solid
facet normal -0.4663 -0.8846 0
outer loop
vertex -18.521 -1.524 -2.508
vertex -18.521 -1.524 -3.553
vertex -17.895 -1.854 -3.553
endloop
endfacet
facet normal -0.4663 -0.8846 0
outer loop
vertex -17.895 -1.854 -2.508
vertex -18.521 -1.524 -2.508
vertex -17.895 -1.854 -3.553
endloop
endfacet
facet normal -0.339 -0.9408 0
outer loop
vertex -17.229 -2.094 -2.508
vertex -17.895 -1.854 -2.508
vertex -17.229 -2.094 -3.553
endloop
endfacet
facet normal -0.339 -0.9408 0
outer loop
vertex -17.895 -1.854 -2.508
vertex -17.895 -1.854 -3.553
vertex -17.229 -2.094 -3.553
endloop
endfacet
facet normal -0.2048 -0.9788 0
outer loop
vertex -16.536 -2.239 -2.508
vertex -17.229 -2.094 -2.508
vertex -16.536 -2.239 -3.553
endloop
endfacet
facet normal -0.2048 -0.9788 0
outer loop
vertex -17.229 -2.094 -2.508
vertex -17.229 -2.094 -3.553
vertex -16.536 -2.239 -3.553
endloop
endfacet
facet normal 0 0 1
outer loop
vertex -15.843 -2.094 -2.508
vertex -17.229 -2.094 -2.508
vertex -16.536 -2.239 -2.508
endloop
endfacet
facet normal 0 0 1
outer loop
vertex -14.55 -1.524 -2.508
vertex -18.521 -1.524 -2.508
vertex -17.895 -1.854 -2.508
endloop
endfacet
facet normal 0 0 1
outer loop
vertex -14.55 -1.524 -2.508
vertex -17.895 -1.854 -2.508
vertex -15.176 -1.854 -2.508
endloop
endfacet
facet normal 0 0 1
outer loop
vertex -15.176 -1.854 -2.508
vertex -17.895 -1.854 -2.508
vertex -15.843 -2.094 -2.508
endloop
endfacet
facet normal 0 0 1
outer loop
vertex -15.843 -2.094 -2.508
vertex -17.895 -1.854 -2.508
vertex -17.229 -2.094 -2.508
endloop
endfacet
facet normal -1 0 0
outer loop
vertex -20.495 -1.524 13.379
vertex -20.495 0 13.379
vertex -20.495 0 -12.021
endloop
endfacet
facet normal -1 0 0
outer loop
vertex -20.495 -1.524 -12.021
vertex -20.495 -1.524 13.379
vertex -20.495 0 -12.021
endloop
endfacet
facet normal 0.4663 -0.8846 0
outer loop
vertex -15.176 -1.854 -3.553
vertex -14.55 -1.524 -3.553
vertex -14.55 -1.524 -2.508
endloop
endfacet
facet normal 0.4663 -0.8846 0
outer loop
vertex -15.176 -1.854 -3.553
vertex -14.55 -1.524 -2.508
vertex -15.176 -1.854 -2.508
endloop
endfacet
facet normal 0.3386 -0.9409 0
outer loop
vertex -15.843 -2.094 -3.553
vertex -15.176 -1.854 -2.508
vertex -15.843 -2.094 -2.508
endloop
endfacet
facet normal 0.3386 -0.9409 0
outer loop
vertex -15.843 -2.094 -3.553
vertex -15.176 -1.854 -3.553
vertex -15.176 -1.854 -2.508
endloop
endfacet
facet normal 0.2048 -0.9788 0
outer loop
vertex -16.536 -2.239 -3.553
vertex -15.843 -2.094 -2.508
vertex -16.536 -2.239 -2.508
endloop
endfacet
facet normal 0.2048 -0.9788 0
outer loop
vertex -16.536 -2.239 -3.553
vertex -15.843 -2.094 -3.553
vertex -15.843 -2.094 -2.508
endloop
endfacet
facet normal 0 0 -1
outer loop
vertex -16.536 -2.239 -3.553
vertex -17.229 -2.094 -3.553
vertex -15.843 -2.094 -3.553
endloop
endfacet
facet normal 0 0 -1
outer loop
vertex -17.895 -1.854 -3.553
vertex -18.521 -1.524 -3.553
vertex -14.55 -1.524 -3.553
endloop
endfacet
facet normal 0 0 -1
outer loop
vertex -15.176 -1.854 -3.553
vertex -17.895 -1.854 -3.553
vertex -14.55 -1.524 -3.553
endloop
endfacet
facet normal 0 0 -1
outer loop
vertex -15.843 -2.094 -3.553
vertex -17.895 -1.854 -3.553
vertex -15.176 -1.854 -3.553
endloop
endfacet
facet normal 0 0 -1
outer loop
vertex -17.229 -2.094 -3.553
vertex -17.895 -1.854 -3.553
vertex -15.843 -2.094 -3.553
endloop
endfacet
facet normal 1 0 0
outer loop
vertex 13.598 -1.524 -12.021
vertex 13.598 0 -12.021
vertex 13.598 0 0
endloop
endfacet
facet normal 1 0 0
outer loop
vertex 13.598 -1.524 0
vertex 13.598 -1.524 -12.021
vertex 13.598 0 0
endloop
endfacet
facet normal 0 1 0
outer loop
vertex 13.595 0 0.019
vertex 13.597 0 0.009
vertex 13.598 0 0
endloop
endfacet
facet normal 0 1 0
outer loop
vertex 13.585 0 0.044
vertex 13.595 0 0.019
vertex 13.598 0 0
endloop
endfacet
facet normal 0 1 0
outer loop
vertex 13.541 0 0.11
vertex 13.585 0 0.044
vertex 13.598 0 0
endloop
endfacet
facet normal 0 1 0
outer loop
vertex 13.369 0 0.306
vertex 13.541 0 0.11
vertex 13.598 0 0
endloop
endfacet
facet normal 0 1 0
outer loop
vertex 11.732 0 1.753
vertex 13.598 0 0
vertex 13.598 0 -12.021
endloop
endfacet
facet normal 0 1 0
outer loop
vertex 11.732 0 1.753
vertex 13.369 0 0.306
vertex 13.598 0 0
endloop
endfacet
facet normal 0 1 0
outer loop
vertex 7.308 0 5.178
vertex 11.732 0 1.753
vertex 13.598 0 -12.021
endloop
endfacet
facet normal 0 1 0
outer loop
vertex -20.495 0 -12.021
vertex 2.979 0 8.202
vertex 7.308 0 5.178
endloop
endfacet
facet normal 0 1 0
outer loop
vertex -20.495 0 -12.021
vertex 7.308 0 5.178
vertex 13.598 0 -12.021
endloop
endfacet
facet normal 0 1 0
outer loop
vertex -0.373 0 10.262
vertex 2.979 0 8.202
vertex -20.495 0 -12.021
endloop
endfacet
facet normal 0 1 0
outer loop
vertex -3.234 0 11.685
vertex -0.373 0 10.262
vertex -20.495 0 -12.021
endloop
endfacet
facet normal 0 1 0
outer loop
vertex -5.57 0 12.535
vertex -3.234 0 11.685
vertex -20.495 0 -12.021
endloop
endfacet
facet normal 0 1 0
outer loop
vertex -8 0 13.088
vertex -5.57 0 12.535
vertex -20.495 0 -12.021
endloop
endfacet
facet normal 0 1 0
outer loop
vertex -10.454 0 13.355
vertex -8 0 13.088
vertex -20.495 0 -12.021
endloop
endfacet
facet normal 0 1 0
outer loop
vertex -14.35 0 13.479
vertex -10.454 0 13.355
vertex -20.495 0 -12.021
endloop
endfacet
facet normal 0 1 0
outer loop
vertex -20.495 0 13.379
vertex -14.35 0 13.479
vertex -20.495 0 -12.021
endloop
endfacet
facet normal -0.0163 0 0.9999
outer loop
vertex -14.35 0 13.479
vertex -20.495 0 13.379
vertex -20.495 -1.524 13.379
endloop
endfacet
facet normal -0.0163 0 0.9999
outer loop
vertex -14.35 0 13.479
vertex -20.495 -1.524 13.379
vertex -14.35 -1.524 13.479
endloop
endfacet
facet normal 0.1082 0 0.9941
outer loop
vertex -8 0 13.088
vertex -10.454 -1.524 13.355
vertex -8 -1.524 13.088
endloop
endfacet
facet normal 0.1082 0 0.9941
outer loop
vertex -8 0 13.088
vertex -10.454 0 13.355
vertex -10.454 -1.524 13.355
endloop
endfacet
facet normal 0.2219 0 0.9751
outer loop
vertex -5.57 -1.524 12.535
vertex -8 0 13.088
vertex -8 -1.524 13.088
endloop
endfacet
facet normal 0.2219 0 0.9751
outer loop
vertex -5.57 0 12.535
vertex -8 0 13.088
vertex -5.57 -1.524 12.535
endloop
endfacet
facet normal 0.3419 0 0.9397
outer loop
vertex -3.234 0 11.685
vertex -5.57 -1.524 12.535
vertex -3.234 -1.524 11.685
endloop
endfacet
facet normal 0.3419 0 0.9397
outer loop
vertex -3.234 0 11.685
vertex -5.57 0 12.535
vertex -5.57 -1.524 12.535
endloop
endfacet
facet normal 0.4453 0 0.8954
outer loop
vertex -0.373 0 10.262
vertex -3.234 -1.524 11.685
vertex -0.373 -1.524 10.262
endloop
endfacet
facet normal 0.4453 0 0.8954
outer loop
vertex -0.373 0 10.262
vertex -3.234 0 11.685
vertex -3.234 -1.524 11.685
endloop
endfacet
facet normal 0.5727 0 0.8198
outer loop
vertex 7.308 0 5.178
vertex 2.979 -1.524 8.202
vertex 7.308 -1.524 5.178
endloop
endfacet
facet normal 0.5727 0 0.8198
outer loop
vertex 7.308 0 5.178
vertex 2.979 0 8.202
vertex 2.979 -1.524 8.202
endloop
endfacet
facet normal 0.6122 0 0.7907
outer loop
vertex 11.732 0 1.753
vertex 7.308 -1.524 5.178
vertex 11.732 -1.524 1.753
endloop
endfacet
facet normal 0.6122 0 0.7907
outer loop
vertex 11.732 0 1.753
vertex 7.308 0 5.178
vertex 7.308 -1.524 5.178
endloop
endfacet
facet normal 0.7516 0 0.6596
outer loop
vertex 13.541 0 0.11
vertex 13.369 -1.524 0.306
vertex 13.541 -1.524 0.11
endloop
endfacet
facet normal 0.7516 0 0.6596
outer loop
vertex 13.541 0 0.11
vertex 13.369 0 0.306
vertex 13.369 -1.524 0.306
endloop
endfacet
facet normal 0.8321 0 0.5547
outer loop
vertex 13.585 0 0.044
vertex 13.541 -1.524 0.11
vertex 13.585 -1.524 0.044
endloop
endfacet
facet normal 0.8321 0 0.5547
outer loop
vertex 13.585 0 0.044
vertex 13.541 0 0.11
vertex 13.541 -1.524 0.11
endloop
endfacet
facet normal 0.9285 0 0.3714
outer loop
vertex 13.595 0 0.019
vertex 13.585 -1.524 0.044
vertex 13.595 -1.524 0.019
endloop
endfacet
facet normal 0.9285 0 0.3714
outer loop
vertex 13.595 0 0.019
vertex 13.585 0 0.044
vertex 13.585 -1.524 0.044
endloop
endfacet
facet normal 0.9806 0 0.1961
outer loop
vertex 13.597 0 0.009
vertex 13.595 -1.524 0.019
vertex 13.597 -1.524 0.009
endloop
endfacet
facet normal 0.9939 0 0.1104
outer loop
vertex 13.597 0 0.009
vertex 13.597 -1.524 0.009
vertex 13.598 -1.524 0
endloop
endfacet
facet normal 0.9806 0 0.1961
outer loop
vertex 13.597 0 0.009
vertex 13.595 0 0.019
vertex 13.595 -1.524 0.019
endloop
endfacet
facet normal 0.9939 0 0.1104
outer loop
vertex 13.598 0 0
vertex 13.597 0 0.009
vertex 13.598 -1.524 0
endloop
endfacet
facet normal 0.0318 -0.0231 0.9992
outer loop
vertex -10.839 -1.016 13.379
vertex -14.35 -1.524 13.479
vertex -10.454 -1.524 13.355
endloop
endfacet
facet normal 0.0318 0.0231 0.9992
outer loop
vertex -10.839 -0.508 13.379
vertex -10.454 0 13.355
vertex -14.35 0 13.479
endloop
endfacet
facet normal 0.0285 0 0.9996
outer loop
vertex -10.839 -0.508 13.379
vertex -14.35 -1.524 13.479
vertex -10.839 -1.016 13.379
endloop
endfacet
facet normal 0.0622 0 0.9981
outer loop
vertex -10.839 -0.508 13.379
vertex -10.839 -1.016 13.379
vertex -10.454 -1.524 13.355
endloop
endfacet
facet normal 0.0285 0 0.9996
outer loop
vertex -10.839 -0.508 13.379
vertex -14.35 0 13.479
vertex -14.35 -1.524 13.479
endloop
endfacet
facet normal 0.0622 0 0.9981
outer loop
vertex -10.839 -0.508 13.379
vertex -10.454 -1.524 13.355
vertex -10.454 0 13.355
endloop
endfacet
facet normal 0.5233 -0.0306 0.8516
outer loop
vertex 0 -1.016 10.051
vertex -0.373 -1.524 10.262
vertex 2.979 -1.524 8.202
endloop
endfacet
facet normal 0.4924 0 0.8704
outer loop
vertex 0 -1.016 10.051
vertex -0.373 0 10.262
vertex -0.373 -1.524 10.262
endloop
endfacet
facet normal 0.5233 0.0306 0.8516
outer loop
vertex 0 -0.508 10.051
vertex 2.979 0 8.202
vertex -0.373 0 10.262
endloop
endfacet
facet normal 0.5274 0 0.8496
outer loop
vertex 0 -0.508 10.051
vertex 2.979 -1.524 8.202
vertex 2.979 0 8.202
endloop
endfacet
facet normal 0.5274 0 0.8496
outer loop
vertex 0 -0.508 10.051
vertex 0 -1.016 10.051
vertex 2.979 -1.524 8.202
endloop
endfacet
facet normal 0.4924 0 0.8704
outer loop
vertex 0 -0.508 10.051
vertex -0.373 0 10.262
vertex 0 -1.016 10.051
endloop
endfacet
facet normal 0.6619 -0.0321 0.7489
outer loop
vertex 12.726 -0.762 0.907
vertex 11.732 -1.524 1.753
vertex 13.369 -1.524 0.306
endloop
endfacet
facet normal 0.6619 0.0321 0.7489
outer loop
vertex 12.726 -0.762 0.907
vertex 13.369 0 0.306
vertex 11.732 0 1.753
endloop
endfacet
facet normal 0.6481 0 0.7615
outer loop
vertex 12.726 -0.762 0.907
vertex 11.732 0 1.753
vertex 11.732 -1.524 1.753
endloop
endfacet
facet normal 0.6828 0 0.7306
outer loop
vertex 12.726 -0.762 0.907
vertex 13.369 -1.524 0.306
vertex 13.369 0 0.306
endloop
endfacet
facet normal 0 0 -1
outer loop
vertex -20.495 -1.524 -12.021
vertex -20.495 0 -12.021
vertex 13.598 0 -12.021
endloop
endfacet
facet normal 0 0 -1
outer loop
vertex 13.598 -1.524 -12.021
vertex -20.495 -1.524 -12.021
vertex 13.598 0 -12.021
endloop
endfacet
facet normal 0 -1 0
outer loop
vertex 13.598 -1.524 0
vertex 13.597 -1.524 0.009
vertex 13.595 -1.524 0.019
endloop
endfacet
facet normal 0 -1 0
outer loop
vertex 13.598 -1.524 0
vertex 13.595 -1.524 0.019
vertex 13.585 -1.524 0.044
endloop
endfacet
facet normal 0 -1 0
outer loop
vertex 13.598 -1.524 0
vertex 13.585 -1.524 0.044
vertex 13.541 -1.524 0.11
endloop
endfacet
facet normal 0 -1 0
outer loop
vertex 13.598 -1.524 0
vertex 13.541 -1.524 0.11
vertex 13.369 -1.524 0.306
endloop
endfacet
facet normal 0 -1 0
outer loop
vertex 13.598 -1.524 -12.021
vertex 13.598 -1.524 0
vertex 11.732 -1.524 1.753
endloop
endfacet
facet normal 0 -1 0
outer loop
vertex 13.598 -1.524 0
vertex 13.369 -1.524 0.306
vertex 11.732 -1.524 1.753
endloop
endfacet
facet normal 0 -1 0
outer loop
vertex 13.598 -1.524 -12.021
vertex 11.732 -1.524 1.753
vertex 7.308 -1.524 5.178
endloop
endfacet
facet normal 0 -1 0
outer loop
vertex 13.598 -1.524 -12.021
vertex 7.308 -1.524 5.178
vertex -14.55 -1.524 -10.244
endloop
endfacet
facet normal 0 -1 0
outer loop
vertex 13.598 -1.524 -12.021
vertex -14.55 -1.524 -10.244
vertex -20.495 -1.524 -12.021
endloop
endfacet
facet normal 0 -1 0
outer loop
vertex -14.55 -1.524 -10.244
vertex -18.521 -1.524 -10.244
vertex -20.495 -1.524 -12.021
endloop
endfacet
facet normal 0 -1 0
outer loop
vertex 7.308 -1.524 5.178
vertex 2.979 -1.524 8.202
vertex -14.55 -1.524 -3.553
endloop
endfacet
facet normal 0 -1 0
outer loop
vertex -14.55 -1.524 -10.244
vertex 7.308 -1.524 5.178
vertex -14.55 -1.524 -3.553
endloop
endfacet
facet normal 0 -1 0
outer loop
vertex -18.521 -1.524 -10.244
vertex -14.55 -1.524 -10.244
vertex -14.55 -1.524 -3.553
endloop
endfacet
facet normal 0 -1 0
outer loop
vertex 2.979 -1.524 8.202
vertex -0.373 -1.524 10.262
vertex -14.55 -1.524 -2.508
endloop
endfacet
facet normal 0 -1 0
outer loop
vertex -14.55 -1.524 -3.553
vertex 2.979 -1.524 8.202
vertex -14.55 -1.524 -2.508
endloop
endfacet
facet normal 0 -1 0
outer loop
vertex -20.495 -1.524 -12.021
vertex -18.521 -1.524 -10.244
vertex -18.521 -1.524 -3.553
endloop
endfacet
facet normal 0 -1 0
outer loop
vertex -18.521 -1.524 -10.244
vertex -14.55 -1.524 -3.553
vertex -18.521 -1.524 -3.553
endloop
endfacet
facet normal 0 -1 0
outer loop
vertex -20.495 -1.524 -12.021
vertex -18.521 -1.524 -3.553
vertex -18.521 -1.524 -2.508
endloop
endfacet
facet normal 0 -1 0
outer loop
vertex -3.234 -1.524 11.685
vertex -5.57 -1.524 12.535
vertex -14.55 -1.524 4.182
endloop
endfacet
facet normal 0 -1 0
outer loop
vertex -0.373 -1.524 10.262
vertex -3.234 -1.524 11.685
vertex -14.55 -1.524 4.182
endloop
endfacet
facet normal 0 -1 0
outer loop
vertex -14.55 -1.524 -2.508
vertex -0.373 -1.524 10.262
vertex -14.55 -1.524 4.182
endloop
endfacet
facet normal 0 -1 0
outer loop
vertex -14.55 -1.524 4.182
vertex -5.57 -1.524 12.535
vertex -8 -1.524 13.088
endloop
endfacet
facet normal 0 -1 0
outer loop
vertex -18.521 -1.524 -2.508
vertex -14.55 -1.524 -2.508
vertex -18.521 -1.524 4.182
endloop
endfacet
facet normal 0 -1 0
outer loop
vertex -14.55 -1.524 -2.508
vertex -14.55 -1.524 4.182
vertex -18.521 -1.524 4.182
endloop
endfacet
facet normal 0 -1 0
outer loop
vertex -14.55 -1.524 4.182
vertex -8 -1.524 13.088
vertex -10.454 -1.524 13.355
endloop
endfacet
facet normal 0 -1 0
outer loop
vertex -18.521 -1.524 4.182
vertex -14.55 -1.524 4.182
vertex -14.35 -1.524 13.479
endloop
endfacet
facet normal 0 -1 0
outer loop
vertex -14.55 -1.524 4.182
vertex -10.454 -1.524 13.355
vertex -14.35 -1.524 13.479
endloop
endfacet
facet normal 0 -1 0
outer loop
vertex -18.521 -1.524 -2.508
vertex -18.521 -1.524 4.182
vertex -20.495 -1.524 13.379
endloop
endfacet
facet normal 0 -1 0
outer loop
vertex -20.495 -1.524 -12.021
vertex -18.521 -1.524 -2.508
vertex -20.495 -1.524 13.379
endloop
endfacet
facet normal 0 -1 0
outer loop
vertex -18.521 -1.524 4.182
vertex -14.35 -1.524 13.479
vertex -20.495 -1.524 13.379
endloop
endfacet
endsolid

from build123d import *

# Parameters (mm, degrees)
F0_W        = 3.9714416489
F0_H        = 1.0451159906
F1_DEPTH    = 1.524
F2_DEPTH    = 2.286
F3_T1_DEPTH = 14.4253962567


# Not quite as in the source:
# - a fillet or chamfer that OpenCascade refuses, or shapes differently, is made with other operations: its cross-section is extruded or revolved along the edge and cut away or added
# - a feature names something its author has since deleted; it is built from what else it names


with BuildPart() as f1:
    # F0 (on Front) → F1 (new body)
    with BuildSketch(Plane.XZ):
        with BuildLine():
            add(Edge.make_bspline(
                [(-20.49517259, 13.3787927493), (-17.1841776189, 13.4669259304), (-10.2854077584, 13.6505597138), (-0.9687704074, 12.0739679533), (13.6266309982, 0.4298166184), (13.5977584869, 0)],
                knots=[0, 0, 0, 0, 0.2817116399, 0.5869727341, 0.9597554024, 0.9597554024, 0.9597554024, 0.9597554024], degree=3))
            Line((-20.49517259, 13.3787927493), (-20.49517259, 0))
            Line((-20.49517259, 0), (13.4006887674, 0))
            Line((13.4006887674, 0), (13.5977584869, 0))
        make_face()
        with BuildLine():
            add(Edge.make_bspline(
                [(13.5977584869, 0), (13.5946414895, -0.0464018269), (13.4976651285, -0.0232009135), (13.4006887674, 0)],
                knots=[0.9597554024, 0.9597554024, 0.9597554024, 0.9597554024, 1, 1, 1, 1], degree=3))
            Line((13.5977584869, 0), (13.4006887674, 0))
        make_face()
        with BuildLine():
            Line((13.4006887674, 0), (-20.49517259, 0))
            Line((-20.49517259, 0), (-20.49517259, -12.0212072507))
            Line((-20.49517259, -12.0212072507), (13.5977584869, -12.0212072507))
            Line((13.5977584869, -12.0212072507), (13.5977584869, 0))
            add(Edge.make_bspline(
                [(13.5977584869, 0), (13.5946414895, -0.0464018269), (13.4976651285, -0.0232009135), (13.4006887674, 0)],
                knots=[0.9597554024, 0.9597554024, 0.9597554024, 0.9597554024, 1, 1, 1, 1], degree=3))
        make_face()
        with Locations((-16.535716597, -3.0308364658)):
            Rectangle(F0_W, F0_H, mode=Mode.SUBTRACT)
    extrude(amount=F1_DEPTH)

    # F0 (on Front) → F2 (join)
    with BuildSketch(Plane.XZ):
        with Locations((-16.535716597, -3.0308364658)):
            Rectangle(F0_W, F0_H)
    extrude(amount=F2_DEPTH)

    # F3: fillet of radius 5.08 on 2 edges, made by hand

    # F3_s2 → F3_t1 (cut)
    with BuildSketch(Plane.XY.offset(-10.2435345941)):
        with BuildLine():
            ThreePointArc((-18.5214374214, -1.524), (-17.2365966643, -2.0917875517), (-15.8453813682, -2.286))
            Line((-15.8453813682, -2.286), (-18.5214374214, -2.286))
            Line((-18.5214374214, -2.286), (-18.5214374214, -1.524))
        make_face()
        with BuildLine():
            ThreePointArc((-14.5499957725, -1.524), (-15.8348365297, -2.0917875517), (-17.2260518258, -2.286))
            Line((-17.2260518258, -2.286), (-14.5499957725, -2.286))
            Line((-14.5499957725, -2.286), (-14.5499957725, -1.524))
        make_face()
    extrude(amount=F3_T1_DEPTH, mode=Mode.SUBTRACT)


solid = f1.part
